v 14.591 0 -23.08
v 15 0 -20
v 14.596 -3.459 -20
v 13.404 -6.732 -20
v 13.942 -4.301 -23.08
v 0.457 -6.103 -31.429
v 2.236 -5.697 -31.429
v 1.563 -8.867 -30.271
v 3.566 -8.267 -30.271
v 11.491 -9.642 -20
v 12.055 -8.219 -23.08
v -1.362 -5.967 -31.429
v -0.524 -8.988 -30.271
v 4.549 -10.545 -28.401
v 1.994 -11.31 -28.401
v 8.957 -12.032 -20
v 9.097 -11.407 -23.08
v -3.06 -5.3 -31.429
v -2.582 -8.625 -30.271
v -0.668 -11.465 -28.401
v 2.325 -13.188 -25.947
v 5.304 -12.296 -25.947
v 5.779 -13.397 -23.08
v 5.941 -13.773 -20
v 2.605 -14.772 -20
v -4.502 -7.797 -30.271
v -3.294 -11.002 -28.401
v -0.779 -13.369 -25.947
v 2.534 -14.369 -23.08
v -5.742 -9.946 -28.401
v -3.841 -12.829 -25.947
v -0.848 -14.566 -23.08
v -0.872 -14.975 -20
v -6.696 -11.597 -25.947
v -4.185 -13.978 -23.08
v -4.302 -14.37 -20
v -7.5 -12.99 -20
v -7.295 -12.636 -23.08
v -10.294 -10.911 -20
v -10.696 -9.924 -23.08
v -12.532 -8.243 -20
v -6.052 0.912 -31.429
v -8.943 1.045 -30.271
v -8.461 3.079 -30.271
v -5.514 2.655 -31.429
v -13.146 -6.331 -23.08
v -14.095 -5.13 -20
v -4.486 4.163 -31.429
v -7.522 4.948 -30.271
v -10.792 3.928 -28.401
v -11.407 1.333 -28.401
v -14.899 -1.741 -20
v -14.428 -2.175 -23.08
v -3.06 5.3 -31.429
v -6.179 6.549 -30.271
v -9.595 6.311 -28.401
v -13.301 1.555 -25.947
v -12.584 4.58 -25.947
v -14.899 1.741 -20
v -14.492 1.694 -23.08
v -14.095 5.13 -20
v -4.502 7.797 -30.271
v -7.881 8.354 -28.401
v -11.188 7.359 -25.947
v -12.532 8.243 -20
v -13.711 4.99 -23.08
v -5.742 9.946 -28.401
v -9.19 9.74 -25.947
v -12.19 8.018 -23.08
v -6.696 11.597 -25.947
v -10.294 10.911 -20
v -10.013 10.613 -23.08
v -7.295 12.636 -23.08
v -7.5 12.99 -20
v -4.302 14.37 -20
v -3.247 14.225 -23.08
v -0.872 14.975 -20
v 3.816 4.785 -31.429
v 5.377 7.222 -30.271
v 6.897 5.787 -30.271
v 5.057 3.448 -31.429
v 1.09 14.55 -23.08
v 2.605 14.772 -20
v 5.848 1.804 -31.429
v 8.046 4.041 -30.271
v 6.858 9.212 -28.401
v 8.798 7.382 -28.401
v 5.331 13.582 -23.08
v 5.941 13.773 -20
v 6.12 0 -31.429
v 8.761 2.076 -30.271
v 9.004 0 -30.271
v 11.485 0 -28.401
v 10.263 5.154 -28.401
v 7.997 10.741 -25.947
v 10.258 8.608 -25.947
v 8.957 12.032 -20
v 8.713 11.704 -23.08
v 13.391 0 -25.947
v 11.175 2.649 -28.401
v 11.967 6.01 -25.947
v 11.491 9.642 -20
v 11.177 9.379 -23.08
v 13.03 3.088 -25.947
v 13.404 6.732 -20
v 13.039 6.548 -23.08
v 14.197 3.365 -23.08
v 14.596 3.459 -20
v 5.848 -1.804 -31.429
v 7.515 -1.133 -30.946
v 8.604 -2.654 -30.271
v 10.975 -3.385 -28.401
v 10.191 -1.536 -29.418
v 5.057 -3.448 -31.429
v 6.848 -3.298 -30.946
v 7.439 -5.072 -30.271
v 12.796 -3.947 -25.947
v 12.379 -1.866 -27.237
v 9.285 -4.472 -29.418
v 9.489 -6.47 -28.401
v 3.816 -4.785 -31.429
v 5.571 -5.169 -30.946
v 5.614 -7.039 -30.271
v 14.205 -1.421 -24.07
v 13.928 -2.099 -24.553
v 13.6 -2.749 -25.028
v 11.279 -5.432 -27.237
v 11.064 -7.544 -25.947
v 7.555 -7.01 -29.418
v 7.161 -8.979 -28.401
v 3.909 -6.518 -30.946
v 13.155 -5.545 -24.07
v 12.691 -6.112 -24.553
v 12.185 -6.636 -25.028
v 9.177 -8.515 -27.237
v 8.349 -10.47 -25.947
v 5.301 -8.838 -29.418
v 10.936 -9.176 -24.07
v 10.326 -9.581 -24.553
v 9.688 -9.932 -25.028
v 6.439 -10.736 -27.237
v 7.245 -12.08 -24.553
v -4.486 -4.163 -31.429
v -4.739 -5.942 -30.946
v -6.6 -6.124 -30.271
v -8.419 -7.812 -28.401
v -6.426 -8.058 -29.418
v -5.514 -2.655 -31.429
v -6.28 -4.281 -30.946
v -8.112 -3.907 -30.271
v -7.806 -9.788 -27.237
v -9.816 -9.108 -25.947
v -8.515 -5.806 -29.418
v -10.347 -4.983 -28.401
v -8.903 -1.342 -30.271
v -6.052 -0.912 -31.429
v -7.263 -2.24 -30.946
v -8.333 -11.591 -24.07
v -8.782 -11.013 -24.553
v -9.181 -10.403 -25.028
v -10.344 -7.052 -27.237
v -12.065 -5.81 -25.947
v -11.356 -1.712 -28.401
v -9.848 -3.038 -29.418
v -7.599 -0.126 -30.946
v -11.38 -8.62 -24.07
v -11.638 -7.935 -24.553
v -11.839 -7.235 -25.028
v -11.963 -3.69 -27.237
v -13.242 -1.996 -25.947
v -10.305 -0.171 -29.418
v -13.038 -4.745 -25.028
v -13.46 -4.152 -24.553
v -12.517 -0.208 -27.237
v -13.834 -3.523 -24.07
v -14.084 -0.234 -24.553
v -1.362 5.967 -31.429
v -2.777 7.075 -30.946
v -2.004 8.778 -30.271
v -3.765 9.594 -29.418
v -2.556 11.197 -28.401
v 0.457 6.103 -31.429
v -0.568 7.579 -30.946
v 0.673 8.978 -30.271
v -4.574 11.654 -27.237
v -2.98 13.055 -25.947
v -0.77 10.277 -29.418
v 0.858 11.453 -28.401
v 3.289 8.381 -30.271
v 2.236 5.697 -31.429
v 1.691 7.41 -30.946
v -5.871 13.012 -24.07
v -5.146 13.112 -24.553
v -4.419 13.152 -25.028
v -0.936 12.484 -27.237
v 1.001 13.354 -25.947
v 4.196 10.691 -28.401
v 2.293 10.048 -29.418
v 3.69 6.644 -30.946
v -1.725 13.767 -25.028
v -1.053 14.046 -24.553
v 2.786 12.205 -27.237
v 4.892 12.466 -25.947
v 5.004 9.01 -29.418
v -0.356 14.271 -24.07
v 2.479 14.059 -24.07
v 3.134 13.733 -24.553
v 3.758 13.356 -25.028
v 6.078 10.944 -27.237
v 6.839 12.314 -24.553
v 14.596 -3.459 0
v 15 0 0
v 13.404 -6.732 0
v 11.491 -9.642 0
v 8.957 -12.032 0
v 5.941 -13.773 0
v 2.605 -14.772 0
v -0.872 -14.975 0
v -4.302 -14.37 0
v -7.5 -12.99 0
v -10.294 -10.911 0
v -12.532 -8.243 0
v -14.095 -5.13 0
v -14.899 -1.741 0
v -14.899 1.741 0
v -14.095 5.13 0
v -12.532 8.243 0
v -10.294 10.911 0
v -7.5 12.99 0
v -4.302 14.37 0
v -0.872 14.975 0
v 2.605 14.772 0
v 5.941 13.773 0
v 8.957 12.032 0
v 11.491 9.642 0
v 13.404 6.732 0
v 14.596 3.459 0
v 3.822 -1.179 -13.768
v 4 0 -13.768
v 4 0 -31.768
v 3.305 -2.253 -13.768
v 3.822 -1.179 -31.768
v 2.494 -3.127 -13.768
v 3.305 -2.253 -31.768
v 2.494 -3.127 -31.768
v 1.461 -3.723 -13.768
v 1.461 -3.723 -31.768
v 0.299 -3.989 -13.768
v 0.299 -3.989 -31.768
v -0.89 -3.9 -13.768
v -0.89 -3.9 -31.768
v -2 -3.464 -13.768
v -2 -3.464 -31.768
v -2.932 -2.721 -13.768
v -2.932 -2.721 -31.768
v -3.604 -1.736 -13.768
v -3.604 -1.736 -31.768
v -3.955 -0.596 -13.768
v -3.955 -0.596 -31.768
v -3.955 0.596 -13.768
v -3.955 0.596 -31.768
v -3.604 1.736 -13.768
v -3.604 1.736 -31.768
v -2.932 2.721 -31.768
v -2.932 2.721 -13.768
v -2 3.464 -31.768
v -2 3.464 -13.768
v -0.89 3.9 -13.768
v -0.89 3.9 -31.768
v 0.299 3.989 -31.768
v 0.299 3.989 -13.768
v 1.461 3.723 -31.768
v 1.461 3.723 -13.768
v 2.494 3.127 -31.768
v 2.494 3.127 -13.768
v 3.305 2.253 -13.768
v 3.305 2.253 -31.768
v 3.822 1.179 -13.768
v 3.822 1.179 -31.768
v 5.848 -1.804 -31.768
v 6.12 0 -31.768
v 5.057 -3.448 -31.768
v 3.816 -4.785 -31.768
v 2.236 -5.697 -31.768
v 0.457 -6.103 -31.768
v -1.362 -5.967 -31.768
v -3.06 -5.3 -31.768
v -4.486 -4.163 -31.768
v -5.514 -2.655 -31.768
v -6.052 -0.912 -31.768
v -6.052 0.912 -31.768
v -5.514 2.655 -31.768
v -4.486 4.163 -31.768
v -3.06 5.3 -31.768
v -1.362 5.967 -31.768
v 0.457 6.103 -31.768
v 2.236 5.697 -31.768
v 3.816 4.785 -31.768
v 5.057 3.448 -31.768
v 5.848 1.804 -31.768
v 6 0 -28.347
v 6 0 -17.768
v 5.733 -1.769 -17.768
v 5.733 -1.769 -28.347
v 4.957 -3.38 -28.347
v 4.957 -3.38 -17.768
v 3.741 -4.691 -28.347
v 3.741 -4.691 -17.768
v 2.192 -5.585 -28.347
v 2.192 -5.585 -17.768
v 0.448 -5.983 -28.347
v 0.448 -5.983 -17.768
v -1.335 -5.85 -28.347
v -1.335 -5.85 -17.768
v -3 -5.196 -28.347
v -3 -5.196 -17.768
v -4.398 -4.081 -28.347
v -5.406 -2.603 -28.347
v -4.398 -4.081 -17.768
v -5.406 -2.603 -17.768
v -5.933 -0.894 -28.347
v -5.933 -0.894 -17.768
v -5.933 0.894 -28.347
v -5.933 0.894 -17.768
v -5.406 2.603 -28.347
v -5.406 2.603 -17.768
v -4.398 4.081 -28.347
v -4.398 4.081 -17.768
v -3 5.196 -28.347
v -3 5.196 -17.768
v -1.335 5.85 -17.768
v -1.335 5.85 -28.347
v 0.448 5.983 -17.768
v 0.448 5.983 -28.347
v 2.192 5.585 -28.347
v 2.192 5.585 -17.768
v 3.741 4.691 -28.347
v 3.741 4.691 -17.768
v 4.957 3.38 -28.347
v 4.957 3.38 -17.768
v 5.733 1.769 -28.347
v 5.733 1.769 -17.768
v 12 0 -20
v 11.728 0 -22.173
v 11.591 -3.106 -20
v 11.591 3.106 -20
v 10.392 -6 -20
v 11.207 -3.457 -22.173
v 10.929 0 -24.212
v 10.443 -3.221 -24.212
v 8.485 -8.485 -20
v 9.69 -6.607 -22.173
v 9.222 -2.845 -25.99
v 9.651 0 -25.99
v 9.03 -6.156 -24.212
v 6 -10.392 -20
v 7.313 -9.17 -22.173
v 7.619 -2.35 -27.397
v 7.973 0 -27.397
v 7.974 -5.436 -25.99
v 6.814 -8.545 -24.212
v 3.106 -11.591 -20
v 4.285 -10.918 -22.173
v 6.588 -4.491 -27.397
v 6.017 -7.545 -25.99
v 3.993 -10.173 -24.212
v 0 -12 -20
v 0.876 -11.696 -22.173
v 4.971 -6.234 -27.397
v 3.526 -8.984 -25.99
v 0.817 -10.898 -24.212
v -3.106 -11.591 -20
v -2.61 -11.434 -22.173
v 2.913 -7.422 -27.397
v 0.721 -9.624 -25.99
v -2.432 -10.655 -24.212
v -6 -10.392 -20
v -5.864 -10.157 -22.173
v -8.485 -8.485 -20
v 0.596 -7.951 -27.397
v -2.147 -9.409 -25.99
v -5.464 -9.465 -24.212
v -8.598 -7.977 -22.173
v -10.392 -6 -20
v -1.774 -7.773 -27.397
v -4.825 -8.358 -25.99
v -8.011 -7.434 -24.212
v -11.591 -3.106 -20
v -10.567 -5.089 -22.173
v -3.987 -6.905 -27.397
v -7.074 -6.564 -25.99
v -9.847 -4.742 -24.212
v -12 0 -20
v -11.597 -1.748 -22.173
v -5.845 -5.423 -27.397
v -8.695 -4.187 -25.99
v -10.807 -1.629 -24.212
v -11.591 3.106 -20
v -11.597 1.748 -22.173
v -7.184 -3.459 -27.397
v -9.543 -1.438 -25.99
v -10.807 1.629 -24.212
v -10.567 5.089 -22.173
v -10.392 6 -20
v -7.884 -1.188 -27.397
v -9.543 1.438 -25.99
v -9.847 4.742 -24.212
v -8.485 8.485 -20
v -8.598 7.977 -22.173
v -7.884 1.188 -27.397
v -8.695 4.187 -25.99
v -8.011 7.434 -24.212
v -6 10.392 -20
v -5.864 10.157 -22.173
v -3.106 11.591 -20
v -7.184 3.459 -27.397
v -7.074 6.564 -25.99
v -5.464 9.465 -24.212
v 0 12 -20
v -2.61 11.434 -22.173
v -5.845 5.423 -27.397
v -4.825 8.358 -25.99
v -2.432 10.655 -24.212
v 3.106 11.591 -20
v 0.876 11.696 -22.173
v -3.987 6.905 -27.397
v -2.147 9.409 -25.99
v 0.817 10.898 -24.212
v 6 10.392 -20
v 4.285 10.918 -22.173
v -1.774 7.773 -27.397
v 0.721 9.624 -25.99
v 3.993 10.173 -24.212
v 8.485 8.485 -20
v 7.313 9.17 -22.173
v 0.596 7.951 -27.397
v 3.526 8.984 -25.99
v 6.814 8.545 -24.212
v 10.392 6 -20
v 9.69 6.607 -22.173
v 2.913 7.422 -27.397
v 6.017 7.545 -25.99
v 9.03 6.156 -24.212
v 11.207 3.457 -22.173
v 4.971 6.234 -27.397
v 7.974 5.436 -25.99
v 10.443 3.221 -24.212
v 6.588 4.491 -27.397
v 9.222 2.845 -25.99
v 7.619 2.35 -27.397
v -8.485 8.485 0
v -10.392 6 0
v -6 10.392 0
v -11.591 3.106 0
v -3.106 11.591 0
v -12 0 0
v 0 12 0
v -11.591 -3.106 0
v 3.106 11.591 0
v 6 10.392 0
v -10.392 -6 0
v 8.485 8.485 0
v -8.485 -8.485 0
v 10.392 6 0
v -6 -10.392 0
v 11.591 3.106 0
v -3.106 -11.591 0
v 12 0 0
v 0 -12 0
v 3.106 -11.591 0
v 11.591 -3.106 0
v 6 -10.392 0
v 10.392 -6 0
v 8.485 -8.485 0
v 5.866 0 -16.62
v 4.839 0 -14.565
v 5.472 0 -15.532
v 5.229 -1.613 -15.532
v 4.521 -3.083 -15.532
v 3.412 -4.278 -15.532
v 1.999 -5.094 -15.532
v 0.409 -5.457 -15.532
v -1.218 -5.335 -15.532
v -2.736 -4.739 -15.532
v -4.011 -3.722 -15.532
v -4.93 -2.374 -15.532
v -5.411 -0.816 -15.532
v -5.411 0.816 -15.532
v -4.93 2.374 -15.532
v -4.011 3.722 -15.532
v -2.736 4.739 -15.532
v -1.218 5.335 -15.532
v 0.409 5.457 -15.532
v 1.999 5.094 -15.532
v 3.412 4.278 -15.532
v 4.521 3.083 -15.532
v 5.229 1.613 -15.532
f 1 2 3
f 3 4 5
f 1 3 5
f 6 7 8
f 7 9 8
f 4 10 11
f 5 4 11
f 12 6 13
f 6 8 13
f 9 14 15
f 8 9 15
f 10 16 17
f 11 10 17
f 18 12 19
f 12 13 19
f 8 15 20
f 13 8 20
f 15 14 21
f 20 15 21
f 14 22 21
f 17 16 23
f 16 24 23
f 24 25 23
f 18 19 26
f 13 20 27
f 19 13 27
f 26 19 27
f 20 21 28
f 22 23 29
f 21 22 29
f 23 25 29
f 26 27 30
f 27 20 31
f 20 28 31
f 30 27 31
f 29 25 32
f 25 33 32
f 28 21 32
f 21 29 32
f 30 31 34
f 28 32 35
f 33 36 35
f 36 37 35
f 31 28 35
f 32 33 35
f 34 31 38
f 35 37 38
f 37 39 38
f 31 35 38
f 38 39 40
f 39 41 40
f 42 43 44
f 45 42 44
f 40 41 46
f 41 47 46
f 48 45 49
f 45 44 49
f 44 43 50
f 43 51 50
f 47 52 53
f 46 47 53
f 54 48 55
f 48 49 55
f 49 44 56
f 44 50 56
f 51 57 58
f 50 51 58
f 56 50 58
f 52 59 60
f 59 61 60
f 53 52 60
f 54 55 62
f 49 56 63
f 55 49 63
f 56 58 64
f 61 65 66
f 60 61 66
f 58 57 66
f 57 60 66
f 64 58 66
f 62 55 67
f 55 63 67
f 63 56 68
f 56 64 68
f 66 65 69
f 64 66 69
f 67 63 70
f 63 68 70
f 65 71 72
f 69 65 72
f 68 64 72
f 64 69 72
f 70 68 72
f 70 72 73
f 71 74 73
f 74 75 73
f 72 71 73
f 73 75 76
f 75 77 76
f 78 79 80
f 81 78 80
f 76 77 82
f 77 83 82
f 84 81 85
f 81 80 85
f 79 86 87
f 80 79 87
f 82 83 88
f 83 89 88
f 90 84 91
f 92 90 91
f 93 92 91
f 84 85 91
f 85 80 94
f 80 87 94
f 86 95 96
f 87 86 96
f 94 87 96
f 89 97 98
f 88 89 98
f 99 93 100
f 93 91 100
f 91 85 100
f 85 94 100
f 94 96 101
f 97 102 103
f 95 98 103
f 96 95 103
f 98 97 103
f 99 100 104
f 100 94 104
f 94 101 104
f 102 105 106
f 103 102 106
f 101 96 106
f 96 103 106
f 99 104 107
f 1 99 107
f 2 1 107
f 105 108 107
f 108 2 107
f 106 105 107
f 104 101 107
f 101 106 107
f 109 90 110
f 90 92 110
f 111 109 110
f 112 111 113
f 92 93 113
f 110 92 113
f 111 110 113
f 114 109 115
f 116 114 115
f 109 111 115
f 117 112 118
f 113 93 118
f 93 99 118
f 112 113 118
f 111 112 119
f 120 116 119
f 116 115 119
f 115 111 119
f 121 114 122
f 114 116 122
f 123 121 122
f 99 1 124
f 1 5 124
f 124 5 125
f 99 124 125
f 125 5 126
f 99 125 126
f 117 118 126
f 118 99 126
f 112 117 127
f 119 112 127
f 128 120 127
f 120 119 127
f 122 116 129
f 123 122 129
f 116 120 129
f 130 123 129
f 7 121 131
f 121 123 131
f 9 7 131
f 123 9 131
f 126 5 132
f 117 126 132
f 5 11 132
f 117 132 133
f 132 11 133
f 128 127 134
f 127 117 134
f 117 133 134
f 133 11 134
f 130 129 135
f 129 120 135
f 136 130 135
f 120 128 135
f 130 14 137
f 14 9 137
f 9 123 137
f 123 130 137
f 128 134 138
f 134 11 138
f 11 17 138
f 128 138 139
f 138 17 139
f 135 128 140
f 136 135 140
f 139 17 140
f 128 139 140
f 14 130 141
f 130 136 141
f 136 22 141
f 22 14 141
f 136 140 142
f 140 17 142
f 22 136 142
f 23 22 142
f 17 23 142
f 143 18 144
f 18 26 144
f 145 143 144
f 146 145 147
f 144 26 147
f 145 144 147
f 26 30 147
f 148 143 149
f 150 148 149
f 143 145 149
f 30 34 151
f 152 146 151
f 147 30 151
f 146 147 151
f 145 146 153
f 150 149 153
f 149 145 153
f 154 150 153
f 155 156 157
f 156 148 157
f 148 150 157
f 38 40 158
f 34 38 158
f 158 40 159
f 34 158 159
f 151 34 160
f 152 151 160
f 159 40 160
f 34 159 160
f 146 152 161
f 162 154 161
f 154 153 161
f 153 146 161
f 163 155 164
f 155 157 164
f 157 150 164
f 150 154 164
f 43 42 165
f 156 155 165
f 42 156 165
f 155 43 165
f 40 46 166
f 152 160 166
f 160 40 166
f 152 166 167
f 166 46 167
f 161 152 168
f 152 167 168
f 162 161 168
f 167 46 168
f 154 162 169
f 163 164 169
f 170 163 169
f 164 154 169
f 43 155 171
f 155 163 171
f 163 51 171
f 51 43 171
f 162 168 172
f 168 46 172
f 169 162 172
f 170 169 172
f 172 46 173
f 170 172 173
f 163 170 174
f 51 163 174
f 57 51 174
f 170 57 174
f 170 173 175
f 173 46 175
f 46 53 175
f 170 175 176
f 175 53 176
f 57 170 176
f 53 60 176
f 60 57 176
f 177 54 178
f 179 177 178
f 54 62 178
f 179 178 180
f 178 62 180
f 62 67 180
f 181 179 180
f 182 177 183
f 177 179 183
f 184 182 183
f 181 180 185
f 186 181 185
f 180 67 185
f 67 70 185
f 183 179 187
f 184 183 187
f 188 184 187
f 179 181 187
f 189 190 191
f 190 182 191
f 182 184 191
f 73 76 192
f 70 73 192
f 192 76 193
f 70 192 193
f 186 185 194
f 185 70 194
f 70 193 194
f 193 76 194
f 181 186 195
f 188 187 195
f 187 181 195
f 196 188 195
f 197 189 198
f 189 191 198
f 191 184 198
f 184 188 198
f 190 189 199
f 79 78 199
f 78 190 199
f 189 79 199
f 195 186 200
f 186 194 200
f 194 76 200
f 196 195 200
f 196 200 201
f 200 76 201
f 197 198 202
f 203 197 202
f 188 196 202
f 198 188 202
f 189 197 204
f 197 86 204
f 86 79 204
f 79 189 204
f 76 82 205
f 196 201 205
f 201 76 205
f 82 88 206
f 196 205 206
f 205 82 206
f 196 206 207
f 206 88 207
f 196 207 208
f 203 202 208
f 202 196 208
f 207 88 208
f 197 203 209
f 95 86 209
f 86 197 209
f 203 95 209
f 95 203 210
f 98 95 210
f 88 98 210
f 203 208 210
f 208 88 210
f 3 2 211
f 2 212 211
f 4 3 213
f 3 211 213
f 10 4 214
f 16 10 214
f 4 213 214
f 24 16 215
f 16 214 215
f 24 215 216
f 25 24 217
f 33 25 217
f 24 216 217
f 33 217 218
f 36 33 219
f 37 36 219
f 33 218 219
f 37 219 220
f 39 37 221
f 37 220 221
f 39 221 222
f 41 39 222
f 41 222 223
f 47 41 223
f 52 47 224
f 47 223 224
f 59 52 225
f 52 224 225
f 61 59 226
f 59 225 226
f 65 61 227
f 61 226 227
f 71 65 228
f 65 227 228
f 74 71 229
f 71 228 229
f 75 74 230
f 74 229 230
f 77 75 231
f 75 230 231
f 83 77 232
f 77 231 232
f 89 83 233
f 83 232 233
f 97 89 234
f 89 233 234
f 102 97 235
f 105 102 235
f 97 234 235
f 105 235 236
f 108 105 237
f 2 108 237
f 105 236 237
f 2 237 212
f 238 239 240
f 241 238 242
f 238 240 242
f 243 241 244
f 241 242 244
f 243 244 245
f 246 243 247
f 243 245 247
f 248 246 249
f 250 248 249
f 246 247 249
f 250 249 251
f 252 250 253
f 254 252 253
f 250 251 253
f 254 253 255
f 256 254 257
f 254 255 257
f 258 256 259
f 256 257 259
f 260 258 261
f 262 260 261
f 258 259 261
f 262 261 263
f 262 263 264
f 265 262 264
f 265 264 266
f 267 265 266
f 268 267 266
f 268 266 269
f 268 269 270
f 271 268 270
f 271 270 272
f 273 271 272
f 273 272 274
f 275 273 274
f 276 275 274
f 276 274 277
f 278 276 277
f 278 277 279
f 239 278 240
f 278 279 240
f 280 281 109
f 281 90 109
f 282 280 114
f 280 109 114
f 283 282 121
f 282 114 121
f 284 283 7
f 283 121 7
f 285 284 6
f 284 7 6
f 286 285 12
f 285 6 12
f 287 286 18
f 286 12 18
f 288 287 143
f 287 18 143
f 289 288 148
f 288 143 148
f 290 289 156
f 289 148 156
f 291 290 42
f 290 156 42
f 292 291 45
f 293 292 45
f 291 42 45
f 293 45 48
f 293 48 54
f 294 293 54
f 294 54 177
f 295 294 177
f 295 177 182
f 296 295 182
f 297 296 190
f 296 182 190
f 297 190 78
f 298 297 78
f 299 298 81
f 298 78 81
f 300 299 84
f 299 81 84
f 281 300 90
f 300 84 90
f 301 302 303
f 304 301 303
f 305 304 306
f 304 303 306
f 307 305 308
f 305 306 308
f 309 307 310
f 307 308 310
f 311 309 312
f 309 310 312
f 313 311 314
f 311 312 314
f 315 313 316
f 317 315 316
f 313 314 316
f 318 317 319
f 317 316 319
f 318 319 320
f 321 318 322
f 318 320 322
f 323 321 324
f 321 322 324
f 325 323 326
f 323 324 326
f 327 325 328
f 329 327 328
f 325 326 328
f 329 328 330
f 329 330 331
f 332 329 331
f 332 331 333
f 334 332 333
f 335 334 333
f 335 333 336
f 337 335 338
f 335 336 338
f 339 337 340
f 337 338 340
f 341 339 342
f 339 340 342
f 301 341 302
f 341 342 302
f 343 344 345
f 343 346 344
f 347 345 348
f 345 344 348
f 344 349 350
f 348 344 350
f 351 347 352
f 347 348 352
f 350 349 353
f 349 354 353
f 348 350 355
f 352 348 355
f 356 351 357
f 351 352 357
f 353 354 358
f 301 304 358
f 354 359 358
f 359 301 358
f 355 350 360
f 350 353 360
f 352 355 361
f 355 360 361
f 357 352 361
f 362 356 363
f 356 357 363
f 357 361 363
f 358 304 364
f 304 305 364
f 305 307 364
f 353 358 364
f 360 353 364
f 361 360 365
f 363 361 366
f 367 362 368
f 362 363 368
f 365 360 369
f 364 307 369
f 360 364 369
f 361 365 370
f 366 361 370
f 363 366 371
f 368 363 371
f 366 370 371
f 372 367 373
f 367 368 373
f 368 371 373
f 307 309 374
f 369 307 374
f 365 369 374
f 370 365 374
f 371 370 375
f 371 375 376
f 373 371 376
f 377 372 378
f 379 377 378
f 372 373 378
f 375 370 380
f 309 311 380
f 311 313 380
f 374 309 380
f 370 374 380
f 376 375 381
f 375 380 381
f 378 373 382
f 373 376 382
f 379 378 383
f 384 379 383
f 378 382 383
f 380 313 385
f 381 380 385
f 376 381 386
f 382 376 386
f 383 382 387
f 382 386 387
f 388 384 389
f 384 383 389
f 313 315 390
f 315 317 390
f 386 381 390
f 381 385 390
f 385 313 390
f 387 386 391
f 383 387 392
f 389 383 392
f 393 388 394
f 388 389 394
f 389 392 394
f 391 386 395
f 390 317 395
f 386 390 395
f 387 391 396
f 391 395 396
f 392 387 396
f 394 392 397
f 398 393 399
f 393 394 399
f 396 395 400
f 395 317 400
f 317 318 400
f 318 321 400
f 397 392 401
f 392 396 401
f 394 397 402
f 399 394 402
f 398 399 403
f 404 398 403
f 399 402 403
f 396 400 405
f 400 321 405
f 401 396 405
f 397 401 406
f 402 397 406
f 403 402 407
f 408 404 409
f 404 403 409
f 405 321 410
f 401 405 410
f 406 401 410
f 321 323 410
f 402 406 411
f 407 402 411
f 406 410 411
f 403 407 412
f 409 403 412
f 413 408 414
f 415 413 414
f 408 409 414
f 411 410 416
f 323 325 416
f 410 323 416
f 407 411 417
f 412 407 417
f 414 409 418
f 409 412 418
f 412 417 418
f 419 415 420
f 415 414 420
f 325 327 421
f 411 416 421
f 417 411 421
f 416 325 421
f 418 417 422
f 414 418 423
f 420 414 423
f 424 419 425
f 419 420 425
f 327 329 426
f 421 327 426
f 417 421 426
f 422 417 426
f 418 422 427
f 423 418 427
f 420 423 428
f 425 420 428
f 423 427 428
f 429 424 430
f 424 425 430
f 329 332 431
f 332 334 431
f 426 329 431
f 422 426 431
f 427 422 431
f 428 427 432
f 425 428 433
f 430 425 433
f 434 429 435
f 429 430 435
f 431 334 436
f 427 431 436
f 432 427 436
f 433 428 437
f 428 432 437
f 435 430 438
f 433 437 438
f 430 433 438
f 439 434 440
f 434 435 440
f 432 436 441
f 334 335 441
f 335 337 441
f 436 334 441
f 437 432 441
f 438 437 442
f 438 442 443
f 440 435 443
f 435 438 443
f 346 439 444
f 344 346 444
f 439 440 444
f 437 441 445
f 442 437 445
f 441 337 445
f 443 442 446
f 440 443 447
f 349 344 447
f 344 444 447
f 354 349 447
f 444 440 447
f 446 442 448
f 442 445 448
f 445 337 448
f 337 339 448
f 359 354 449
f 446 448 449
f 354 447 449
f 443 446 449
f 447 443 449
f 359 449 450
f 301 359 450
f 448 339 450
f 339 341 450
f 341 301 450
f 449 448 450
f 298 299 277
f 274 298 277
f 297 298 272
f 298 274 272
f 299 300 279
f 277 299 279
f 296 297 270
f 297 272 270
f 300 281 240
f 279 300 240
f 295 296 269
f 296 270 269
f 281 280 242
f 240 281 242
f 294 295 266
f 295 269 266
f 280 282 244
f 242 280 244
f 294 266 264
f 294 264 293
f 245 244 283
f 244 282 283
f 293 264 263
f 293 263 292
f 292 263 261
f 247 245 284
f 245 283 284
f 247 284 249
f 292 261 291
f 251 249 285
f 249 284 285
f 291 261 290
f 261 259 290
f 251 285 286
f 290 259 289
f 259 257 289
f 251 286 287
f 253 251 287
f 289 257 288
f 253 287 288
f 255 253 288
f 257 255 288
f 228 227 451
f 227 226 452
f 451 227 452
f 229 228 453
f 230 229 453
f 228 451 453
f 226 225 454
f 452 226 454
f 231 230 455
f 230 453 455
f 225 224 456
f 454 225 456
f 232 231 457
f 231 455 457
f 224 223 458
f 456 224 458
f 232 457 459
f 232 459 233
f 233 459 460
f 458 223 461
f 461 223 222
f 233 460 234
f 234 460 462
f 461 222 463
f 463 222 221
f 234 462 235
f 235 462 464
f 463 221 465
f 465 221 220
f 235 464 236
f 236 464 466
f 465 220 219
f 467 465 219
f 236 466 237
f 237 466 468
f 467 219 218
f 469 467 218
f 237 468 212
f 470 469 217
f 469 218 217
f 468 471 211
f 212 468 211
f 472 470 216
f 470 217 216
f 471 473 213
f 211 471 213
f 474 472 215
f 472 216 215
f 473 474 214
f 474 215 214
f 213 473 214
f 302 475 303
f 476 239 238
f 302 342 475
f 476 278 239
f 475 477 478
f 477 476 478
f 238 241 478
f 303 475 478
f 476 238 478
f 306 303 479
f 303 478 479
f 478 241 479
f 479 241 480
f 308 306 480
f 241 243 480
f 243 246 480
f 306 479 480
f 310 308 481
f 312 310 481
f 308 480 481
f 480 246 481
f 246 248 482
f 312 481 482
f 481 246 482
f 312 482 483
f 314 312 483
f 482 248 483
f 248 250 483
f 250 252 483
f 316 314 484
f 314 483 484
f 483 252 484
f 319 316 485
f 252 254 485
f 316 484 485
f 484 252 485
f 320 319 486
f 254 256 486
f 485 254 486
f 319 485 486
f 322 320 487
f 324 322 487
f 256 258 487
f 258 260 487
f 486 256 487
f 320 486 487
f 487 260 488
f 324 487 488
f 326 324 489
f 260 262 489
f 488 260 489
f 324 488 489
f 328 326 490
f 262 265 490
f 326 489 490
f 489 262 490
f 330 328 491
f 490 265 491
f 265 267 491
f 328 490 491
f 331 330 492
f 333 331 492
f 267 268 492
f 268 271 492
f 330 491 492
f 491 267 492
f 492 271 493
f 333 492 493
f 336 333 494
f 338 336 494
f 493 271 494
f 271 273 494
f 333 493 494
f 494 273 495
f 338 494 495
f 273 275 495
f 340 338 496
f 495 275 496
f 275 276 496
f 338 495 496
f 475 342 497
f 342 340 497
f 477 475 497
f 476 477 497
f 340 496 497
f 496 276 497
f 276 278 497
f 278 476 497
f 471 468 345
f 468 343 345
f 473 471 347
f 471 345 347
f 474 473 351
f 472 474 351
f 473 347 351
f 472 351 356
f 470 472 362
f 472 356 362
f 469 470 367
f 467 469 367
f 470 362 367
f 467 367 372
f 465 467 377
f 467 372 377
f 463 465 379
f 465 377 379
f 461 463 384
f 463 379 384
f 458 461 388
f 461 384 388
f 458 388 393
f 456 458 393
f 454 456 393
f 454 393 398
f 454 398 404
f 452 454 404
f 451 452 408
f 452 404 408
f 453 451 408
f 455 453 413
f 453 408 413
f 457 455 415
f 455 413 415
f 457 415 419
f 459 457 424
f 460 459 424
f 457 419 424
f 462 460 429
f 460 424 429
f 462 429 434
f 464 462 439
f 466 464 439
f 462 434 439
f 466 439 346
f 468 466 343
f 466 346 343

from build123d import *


# Not quite as in the source:
# - a fillet or chamfer that OpenCascade refuses, or shapes differently, is made with other operations: its cross-section is extruded or revolved along the edge and cut away or added


with BuildPart() as f1:
    # F0 (on Front) → F1 (revolve)
    with BuildSketch(Plane.XZ):
        with BuildLine():
            Line((15, 0), (13.5, 0))
            Line((13.5, 0), (12, 0))
            Line((12, 0), (12, -1.5))
            Line((12, -1.5), (12, -20))
            ThreePointArc((12, -20), (10.3452954698, -25.1406164595), (6, -28.3472333599))
            ThreePointArc((6, -28.3472333599), (5.0122671395, -28.6160728483), (4, -28.7684083747))
            Line((4, -28.7684083747), (4, -31.7684083747))
            Line((4, -31.7684083747), (6.1201079457, -31.7684083747))
            Line((6.1201079457, -31.7684083747), (6.1201079457, -31.4292851344))
            ThreePointArc((6.1201079457, -31.4292851344), (12.5191285439, -27.2367299518), (15, -20))
            Line((15, -20), (15, 0))
        make_face()
        with BuildLine():
            ThreePointArc((4, -28.7684083747), (5.0122671395, -28.6160728483), (6, -28.3472333599))
            Line((6, -28.3472333599), (6, -13.7684083747))
            Line((6, -13.7684083747), (4, -13.7684083747))
            Line((4, -13.7684083747), (4, -28.7684083747))
        make_face()
    revolve(axis=Axis((0, 0, -27.0683728158), (0, 0, -1)))

    # F2: fillet of radius 5 on 1 edges, made by hand

    # F2_s1 → F2_t2 (revolve, cut)
    with BuildSketch(Plane.XZ):
        with BuildLine():
            ThreePointArc((6, -17.7684083747), (5.472135955, -15.5323403972), (4, -13.7684083747))
            Line((4, -13.7684083747), (6, -13.7684083747))
            Line((6, -13.7684083747), (6, -17.7684083747))
        make_face()
    revolve(axis=Axis((0, 0, -13.7684083747), (0, 0, -1)), mode=Mode.SUBTRACT)


solid = f1.part
